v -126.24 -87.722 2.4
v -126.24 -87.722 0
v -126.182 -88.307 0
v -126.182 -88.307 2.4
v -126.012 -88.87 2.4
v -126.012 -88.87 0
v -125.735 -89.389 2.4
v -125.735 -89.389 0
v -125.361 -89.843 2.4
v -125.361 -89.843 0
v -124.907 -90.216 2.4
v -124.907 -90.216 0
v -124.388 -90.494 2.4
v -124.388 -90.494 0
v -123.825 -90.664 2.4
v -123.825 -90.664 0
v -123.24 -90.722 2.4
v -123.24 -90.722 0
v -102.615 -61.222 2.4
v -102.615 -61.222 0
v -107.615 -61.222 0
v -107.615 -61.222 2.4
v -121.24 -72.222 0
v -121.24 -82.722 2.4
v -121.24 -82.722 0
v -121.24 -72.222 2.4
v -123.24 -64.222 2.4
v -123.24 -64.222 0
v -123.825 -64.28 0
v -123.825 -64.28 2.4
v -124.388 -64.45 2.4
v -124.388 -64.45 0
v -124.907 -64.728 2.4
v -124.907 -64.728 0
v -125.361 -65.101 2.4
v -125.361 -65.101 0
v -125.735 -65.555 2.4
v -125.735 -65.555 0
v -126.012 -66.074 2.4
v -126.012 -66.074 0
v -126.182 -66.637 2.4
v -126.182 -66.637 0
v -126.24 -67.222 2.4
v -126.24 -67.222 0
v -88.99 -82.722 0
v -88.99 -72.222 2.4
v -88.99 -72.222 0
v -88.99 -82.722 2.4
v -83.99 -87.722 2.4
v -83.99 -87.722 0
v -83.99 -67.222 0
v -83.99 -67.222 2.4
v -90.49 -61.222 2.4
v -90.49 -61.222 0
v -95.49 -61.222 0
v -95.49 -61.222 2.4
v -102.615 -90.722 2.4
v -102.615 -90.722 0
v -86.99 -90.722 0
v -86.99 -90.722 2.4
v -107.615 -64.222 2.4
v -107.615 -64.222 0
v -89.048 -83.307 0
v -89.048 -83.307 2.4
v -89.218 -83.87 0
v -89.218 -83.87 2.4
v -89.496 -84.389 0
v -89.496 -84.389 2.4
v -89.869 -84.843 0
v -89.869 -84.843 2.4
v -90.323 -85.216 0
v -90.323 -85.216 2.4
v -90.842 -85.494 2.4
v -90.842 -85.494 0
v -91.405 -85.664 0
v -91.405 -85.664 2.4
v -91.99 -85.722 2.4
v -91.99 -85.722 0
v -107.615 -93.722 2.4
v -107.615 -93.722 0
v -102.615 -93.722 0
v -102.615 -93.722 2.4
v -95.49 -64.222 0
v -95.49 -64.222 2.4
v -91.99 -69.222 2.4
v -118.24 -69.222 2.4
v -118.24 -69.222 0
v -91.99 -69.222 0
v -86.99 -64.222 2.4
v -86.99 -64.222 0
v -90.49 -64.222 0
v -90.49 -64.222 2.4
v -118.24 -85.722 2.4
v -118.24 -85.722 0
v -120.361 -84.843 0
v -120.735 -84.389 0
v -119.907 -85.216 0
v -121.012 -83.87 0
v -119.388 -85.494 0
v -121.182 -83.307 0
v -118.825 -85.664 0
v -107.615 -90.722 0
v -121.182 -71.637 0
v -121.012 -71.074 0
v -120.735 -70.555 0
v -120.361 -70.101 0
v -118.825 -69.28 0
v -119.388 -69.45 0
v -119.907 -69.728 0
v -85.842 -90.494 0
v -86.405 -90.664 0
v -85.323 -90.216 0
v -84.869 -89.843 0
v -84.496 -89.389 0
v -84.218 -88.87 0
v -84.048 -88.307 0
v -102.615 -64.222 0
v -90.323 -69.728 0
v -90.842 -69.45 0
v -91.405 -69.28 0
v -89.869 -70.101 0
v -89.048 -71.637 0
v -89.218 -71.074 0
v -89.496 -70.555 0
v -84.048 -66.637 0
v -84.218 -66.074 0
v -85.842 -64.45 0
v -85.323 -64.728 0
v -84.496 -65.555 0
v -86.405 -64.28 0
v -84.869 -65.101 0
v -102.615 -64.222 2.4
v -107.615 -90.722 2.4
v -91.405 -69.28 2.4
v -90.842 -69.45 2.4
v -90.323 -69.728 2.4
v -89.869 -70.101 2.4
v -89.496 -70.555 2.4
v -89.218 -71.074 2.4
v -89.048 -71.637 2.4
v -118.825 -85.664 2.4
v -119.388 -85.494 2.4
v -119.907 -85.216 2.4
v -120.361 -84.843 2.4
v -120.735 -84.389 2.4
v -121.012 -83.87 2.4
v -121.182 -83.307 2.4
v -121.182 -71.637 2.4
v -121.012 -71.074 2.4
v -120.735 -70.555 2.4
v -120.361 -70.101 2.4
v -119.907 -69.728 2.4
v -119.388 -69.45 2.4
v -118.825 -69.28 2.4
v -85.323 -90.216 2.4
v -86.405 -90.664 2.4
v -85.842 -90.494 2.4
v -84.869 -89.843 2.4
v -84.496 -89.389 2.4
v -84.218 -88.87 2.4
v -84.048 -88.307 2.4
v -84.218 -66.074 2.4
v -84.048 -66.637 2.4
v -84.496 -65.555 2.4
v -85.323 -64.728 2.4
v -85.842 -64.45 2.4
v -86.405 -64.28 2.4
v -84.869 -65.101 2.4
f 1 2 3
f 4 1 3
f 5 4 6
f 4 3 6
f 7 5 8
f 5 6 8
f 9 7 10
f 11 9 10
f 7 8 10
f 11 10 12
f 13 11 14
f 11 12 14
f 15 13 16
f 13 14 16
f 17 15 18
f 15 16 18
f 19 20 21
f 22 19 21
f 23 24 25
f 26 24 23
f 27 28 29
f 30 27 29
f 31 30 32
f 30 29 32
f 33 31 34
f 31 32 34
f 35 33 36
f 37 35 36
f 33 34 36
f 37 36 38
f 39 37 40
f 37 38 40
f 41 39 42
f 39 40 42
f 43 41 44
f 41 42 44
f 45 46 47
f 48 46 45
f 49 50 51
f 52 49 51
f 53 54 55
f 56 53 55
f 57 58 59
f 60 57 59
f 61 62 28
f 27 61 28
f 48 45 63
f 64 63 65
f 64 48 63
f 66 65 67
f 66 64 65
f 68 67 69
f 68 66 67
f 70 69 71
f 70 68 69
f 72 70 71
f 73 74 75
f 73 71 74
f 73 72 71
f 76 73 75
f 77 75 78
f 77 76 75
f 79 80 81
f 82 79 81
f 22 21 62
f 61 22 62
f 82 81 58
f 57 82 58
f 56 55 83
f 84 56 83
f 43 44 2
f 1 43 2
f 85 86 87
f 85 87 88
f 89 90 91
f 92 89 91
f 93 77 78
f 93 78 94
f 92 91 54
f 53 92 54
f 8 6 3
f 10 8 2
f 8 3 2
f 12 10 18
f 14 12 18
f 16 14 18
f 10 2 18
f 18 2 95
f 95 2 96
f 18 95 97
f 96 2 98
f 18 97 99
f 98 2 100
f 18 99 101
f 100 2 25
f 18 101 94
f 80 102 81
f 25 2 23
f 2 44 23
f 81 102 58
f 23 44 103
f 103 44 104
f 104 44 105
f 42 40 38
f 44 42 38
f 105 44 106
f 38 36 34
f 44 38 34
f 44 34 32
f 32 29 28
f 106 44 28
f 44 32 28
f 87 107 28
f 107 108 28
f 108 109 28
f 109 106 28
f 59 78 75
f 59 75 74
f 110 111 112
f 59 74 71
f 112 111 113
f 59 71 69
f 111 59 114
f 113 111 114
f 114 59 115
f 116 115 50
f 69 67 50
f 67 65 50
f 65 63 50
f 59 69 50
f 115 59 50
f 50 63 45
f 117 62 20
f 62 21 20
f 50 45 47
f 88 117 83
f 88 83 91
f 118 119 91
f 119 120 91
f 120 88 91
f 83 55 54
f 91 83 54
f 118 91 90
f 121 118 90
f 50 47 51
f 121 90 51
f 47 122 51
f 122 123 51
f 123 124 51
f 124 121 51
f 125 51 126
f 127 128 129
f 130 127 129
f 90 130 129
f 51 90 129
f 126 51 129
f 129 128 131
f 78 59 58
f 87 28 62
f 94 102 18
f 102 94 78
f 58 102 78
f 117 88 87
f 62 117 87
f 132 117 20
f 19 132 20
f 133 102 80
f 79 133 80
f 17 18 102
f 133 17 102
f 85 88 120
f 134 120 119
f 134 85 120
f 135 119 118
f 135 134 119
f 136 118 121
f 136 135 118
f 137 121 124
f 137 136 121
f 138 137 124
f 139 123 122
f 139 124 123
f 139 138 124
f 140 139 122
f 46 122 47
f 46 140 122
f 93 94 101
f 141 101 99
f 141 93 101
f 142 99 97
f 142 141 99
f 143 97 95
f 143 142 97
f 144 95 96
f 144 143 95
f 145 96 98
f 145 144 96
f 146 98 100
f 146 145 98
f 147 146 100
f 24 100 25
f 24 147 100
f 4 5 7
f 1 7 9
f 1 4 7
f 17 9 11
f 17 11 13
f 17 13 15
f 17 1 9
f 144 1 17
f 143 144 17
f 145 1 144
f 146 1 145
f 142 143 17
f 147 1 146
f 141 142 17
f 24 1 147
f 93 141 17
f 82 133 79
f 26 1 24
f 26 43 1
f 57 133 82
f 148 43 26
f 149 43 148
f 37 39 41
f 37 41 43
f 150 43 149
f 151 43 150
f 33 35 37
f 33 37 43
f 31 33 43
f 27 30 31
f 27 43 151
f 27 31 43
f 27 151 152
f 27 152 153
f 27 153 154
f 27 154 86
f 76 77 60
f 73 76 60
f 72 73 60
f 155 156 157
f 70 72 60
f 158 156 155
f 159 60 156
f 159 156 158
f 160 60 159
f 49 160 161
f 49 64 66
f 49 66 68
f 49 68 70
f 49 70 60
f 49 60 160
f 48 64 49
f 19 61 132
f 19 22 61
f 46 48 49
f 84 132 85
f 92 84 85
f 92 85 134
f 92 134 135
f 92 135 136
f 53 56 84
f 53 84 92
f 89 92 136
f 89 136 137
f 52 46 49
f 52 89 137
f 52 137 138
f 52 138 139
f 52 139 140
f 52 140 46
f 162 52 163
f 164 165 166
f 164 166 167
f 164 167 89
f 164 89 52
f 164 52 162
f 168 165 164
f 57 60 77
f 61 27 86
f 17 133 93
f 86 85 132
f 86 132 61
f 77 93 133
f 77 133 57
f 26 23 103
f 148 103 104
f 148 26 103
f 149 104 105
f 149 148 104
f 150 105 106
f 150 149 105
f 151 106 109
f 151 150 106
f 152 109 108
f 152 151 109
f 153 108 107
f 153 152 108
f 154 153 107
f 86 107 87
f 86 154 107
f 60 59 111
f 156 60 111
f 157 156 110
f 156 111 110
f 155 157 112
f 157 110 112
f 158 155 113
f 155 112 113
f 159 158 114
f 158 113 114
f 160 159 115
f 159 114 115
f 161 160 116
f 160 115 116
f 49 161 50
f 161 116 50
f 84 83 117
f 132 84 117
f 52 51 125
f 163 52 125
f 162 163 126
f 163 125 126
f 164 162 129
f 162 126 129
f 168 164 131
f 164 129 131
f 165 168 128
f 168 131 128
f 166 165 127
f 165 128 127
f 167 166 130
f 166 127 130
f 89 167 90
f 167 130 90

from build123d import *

# Parameters (mm, degrees)
SALIENTE_EXTRUIR1_DEPTH = 2.4
CORTAR_EXTRUIR1_DEPTH   = 4


with BuildPart() as part:
    # Croquis1 → Saliente-Extruir1 (new body)
    with BuildSketch(Plane.XY):
        with BuildLine():
            Line((-102.615102368, -90.721952824), (-86.990102368, -90.721952824))
            ThreePointArc((-86.990102368, -90.721952824), (-84.868782024, -89.843273168), (-83.990102368, -87.721952824))
            Line((-83.990102368, -87.721952824), (-83.990102368, -67.221952824))
            ThreePointArc((-83.990102368, -67.221952824), (-84.868782024, -65.10063248), (-86.990102368, -64.221952824))
            Line((-86.990102368, -64.221952824), (-90.490102368, -64.221952824))
            Line((-90.490102368, -64.221952824), (-90.490102368, -61.221952824))
            Line((-90.490102368, -61.221952824), (-95.490102368, -61.221952824))
            Line((-95.490102368, -61.221952824), (-95.490102368, -64.221952824))
            Line((-95.490102368, -64.221952824), (-102.615102368, -64.221952824))
            Line((-102.615102368, -64.221952824), (-102.615102368, -61.221952824))
            Line((-102.615102368, -61.221952824), (-105.115102368, -61.221952824))
            Line((-105.115102368, -61.221952824), (-107.615102368, -61.221952824))
            Line((-107.615102368, -61.221952824), (-107.615102368, -64.221952824))
            Line((-107.615102368, -64.221952824), (-123.240102368, -64.221952824))
            ThreePointArc((-123.240102368, -64.221952824), (-125.361422711, -65.10063248), (-126.240102368, -67.221952824))
            Line((-126.240102368, -67.221952824), (-126.240102368, -87.721952824))
            ThreePointArc((-126.240102368, -87.721952824), (-125.361422711, -89.843273168), (-123.240102368, -90.721952824))
            Line((-123.240102368, -90.721952824), (-107.615102368, -90.721952824))
            Line((-107.615102368, -90.721952824), (-107.615102368, -93.721952824))
            Line((-107.615102368, -93.721952824), (-102.615102368, -93.721952824))
            Line((-102.615102368, -93.721952824), (-102.615102368, -90.721952824))
        make_face()
    extrude(amount=SALIENTE_EXTRUIR1_DEPTH)

    # Croquis2 → Cortar-Extruir1 (cut)
    with BuildSketch(Plane.XY.offset(2.4)):
        with BuildLine():
            Line((-115.427602368, -69.221952824), (-91.990102368, -69.221952824))
            ThreePointArc((-91.990102368, -69.221952824), (-89.868782024, -70.10063248), (-88.990102368, -72.221952824))
            Line((-88.990102368, -72.221952824), (-88.990102368, -82.721952824))
            ThreePointArc((-88.990102368, -82.721952824), (-89.868782024, -84.843273168), (-91.990102368, -85.721952824))
            Line((-91.990102368, -85.721952824), (-118.240102368, -85.721952824))
            ThreePointArc((-118.240102368, -85.721952824), (-120.361422711, -84.843273168), (-121.240102368, -82.721952824))
            Line((-121.240102368, -82.721952824), (-121.240102368, -72.221952824))
            ThreePointArc((-121.240102368, -72.221952824), (-120.361422711, -70.10063248), (-118.240102368, -69.221952824))
            Line((-118.240102368, -69.221952824), (-115.427602368, -69.221952824))
        make_face()
    extrude(amount=-CORTAR_EXTRUIR1_DEPTH, mode=Mode.SUBTRACT)


solid = part.part
